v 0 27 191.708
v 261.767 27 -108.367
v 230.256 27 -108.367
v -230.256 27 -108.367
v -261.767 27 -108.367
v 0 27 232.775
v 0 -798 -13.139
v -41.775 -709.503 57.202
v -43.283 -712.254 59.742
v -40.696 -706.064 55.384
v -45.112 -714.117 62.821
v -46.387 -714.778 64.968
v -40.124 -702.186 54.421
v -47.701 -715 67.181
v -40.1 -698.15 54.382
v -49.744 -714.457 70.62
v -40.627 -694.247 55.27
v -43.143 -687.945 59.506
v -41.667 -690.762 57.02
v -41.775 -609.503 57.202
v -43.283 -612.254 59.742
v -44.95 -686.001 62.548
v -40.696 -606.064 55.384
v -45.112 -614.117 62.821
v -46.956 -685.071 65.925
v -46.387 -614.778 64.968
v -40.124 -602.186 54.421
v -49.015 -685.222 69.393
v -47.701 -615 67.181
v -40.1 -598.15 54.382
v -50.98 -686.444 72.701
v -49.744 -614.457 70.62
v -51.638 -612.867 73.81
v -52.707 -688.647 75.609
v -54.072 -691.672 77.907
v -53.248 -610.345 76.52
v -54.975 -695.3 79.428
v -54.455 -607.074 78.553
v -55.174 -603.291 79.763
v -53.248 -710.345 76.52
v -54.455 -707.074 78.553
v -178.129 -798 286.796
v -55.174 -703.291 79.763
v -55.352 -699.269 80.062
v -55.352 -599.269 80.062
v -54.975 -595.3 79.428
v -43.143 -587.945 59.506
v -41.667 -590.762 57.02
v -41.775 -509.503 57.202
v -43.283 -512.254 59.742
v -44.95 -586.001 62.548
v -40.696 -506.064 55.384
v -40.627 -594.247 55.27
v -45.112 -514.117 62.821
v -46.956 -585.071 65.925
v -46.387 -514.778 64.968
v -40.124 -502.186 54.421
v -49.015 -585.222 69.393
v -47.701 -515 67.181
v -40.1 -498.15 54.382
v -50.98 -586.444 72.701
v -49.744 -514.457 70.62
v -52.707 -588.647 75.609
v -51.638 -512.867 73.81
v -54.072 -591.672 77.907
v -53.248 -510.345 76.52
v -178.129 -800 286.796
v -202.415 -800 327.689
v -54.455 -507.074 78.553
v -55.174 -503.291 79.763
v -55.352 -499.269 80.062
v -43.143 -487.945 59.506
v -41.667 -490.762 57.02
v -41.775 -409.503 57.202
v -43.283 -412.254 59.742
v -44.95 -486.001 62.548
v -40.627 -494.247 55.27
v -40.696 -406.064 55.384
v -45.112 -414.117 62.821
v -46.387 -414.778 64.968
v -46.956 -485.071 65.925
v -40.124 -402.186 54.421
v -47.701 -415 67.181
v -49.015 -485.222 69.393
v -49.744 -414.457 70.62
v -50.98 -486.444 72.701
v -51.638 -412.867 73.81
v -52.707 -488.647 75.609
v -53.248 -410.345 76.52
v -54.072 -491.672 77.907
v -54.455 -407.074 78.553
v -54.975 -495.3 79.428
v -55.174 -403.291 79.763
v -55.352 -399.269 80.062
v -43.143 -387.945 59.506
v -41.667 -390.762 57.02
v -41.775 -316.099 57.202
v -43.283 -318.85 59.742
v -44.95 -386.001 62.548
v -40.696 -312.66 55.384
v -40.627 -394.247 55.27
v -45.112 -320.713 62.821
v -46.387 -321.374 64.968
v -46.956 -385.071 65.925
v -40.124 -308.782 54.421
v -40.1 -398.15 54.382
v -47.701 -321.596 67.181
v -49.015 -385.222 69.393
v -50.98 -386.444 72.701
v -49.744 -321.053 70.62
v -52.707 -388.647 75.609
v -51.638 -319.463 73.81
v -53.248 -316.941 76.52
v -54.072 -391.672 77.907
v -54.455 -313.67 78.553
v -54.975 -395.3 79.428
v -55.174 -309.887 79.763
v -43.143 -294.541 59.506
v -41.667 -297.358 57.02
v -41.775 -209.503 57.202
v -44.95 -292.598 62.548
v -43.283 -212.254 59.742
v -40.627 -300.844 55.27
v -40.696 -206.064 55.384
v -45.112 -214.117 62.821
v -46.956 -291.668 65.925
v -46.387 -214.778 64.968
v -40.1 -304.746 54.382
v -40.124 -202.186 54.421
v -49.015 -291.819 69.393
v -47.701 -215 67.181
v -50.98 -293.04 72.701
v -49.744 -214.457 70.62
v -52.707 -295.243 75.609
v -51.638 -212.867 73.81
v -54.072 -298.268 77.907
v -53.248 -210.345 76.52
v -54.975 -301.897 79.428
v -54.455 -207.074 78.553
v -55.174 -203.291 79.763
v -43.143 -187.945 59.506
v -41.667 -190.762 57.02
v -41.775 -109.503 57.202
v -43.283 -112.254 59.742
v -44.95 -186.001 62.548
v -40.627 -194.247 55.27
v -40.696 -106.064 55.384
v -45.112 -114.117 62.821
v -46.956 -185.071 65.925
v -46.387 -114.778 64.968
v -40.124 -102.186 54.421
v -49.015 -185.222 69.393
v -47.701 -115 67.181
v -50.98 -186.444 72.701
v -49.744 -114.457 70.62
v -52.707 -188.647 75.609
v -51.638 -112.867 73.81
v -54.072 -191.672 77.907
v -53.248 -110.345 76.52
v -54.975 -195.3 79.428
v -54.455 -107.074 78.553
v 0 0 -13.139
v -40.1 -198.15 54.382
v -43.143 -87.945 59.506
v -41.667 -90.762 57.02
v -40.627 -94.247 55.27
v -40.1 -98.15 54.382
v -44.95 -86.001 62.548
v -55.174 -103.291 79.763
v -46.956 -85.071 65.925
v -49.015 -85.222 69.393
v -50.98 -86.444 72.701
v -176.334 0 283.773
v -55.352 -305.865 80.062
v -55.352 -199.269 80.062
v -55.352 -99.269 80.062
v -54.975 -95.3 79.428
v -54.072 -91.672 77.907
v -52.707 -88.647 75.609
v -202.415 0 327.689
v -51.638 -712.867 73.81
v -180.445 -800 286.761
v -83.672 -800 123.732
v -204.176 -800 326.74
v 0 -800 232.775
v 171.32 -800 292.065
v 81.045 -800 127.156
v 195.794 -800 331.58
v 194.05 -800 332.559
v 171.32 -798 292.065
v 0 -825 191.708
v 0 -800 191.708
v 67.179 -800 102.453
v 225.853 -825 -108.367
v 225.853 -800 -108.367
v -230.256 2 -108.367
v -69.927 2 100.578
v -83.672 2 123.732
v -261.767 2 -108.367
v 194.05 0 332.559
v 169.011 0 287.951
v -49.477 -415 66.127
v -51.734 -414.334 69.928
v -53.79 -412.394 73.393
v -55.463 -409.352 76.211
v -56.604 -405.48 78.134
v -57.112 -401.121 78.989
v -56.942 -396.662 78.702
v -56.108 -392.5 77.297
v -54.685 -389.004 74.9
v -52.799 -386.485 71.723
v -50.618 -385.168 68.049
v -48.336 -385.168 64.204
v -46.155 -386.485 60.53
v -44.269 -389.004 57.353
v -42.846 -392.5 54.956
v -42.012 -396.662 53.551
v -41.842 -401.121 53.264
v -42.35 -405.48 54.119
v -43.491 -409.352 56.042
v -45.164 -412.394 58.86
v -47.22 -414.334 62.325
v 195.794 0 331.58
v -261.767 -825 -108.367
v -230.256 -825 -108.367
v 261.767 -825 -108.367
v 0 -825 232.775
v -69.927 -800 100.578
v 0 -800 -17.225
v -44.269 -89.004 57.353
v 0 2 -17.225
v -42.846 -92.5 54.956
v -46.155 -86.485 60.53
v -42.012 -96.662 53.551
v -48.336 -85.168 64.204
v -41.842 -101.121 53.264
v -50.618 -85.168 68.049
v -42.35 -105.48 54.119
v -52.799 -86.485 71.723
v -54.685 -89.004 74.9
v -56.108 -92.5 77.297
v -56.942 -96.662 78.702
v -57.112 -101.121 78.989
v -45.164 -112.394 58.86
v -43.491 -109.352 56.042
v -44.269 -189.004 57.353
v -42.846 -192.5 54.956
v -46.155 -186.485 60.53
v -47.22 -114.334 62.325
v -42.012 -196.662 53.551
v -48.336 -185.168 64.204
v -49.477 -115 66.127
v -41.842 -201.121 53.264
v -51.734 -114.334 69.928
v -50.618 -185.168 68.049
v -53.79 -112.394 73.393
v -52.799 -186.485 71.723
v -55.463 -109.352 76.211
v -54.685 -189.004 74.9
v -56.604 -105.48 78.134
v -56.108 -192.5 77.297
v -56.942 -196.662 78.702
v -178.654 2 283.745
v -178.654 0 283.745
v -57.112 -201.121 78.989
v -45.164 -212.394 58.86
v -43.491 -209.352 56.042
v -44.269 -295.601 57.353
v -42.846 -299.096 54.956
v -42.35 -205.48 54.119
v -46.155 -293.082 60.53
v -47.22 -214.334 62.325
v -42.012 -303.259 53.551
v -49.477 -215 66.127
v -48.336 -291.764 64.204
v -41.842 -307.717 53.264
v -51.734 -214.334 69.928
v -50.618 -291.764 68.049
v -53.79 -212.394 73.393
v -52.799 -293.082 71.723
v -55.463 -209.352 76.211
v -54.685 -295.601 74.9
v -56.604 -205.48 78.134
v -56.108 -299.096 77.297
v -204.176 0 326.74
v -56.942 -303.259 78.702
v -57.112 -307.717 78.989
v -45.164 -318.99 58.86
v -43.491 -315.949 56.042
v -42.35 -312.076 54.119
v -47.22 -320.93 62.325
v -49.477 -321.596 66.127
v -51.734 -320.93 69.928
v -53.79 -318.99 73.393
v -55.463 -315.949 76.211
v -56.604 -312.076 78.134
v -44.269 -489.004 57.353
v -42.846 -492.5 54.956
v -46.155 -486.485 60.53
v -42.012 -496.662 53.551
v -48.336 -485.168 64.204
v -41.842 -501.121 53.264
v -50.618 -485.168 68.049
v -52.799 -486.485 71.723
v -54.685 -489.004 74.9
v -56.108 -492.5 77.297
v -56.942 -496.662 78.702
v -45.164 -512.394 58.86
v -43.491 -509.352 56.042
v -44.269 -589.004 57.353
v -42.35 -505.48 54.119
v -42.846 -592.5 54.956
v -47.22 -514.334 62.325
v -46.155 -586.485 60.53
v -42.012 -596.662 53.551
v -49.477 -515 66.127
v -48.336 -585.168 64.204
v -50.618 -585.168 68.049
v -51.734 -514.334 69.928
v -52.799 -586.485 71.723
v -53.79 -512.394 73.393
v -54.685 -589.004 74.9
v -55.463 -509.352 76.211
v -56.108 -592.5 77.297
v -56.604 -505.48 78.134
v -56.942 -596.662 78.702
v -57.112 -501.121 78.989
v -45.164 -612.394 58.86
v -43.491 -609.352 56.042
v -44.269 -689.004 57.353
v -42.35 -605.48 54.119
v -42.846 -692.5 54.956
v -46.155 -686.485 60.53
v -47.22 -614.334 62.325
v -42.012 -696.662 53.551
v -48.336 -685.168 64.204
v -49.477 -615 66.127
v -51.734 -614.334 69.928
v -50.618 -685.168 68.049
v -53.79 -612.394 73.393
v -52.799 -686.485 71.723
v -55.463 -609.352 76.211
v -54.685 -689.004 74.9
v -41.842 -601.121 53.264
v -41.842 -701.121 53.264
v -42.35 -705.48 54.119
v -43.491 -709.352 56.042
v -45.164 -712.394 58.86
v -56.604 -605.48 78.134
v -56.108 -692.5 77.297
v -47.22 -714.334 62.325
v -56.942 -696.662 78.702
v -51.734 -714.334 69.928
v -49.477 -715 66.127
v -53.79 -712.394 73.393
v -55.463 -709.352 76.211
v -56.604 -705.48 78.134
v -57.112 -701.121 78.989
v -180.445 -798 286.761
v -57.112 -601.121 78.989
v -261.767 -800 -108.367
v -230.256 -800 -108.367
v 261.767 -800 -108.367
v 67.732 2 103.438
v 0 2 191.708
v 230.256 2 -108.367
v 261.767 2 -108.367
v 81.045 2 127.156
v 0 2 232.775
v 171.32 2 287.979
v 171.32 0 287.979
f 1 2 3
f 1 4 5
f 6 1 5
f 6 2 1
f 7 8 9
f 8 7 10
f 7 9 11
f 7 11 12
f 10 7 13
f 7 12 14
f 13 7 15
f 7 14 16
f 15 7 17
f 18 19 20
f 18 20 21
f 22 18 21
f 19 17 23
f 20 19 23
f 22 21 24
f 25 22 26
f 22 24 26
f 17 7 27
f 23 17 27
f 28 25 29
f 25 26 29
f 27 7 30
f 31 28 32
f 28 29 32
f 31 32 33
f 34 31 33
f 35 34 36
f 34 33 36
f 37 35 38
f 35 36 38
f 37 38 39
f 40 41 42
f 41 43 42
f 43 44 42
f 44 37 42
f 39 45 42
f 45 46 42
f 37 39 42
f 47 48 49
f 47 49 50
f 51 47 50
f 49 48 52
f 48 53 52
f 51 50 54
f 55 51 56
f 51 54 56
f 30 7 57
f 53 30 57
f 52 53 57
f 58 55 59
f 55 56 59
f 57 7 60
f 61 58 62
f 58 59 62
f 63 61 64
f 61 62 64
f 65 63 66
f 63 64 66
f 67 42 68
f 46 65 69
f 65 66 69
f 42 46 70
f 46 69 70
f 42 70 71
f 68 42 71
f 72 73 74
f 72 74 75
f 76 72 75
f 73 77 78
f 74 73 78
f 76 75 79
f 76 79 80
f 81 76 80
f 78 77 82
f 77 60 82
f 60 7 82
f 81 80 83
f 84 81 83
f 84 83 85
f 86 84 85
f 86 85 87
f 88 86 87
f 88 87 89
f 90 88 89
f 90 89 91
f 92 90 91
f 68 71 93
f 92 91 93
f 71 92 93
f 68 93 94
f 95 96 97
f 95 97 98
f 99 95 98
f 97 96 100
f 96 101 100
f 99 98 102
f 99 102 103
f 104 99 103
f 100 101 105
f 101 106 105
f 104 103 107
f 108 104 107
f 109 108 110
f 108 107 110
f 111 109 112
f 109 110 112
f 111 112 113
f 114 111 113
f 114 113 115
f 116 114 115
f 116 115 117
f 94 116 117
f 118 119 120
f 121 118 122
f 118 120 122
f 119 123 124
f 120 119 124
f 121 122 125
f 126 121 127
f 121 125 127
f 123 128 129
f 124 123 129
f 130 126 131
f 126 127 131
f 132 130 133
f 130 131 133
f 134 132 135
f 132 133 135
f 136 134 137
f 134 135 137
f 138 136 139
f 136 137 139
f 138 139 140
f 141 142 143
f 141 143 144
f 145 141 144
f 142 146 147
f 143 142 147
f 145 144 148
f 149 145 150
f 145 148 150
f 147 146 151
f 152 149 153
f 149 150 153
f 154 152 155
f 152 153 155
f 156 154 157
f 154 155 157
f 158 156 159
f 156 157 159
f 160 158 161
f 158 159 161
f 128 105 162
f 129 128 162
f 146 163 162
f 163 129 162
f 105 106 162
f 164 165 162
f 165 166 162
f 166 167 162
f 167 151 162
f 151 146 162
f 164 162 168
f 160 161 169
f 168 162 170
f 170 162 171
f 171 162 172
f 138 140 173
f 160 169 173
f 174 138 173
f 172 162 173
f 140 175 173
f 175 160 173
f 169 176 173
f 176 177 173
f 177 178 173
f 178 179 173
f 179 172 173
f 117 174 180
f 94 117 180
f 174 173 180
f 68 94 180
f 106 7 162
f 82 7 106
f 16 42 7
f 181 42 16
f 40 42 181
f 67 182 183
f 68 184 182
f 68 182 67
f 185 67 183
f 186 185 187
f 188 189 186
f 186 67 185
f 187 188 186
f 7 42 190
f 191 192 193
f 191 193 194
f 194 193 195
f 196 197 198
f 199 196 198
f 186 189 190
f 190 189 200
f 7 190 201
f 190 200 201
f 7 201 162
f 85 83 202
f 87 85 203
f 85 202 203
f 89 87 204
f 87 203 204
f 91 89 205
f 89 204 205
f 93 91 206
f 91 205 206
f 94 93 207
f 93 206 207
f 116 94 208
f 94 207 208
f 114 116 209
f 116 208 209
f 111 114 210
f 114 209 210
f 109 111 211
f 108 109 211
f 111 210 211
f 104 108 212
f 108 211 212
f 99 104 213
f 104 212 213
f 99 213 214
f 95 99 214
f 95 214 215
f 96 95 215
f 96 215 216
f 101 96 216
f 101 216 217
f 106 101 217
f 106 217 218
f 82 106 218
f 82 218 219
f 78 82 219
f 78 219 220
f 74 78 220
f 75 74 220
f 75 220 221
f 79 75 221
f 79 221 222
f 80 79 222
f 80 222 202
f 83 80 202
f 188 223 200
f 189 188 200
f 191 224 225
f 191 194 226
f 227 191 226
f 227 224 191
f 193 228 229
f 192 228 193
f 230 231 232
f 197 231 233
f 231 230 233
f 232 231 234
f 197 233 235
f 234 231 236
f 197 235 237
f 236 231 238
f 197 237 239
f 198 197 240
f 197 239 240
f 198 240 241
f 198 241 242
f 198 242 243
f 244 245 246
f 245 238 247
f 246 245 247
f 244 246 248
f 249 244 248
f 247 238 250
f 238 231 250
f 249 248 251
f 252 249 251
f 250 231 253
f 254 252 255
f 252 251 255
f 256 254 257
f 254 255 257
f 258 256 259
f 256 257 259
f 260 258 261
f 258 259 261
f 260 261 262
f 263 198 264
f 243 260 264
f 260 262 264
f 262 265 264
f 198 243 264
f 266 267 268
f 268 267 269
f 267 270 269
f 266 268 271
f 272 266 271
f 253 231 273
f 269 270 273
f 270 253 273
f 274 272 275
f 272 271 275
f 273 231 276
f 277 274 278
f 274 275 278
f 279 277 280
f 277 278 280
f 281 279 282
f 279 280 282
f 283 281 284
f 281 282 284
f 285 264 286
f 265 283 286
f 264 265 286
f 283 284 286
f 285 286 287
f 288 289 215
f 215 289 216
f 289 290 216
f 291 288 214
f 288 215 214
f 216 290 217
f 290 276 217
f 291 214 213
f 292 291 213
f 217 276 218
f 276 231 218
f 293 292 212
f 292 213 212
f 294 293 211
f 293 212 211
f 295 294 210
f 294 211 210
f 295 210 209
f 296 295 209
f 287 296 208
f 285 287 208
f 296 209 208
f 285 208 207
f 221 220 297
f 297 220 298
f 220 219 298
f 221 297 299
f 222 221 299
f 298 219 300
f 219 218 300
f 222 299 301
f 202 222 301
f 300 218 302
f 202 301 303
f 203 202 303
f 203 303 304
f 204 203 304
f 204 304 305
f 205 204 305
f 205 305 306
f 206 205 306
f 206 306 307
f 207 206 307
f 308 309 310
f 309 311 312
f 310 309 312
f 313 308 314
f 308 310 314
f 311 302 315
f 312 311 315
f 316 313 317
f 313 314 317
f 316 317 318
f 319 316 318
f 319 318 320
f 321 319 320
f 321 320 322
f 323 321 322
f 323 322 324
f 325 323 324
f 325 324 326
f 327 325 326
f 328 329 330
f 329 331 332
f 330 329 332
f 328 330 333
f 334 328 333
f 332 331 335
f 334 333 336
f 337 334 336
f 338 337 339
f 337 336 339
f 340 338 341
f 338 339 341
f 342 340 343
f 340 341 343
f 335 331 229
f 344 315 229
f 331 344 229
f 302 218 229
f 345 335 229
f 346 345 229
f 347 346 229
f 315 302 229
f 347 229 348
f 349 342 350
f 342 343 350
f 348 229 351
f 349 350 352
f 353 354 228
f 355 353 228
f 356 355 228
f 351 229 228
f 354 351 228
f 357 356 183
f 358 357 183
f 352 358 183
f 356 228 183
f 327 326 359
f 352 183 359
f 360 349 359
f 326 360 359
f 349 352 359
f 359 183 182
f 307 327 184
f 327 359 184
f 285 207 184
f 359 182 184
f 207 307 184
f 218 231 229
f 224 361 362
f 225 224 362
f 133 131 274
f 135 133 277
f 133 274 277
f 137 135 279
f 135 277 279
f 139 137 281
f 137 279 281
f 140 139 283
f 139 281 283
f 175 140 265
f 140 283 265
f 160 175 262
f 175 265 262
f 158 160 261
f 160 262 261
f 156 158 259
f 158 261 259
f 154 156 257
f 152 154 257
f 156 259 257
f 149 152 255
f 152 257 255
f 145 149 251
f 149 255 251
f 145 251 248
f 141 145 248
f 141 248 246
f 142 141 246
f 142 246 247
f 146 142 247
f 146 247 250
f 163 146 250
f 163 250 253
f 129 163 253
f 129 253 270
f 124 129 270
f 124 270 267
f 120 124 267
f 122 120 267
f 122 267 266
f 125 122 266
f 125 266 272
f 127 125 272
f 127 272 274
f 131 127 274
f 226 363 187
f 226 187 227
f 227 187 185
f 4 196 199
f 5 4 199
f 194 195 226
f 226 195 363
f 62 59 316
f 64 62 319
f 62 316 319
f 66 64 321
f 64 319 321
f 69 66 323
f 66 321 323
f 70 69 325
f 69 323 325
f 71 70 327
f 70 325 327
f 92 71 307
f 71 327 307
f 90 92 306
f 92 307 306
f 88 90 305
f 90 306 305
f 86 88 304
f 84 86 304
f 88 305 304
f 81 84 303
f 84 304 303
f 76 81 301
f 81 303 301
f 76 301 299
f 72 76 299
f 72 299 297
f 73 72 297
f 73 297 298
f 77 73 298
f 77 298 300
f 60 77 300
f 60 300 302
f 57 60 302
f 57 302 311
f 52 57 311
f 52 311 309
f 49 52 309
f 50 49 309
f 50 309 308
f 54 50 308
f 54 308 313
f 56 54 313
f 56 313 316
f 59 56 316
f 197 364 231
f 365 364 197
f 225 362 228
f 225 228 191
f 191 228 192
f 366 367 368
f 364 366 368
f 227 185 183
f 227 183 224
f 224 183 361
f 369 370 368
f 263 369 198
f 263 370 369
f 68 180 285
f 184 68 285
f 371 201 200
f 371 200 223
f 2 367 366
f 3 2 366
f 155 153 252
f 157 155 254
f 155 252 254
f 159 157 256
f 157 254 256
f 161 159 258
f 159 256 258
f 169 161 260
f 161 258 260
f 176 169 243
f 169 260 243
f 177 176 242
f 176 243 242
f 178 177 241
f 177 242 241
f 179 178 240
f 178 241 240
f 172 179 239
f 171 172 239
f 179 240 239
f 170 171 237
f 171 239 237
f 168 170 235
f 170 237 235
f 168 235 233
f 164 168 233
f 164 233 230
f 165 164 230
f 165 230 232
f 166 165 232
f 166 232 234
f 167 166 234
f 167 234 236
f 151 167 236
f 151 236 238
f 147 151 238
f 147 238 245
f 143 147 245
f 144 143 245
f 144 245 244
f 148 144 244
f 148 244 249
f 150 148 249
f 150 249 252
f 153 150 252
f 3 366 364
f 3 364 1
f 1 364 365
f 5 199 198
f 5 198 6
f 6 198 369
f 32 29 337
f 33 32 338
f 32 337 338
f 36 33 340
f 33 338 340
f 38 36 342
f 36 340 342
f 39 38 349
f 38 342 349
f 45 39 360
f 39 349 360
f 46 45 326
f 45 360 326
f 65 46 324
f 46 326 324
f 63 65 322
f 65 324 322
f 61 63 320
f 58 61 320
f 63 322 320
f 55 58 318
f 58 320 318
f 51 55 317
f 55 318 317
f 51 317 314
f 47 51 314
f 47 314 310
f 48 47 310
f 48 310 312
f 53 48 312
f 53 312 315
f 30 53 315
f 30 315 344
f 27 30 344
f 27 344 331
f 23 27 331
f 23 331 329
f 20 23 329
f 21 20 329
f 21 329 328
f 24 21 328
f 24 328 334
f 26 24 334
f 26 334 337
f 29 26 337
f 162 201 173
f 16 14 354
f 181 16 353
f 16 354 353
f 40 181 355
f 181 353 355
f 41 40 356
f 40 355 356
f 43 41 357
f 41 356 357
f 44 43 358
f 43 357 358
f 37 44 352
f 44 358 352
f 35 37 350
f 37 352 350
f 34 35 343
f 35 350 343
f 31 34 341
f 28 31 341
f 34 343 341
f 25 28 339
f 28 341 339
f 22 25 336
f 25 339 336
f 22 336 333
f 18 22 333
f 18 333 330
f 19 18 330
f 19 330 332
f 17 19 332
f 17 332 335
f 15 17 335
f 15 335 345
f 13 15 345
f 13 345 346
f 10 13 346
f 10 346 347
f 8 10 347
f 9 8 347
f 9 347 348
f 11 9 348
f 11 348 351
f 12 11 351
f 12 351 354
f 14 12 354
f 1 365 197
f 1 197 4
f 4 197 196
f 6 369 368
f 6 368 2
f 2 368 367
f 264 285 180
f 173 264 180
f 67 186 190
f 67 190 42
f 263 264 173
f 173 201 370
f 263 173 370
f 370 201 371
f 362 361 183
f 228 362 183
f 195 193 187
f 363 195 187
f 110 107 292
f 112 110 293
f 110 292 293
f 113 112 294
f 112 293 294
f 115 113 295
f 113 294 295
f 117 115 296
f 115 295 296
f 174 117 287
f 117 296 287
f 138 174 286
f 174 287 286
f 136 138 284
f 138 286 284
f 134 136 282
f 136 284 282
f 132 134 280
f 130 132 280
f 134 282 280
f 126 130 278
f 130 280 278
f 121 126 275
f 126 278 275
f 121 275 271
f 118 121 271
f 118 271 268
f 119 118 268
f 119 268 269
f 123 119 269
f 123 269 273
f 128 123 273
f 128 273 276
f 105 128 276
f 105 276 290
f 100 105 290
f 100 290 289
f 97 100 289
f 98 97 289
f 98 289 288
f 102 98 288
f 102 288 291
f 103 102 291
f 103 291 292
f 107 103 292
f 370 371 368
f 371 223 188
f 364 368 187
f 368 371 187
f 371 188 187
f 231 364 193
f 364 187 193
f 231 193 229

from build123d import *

# Parameters (mm, degrees)
F1_DEPTH  = 800
F3_DEPTH  = 2
F5_DEPTH  = 2
F7_DEPTH  = 25
F9_DEPTH  = 25
F11_R     = 15
F12_DEPTH = 10


with BuildPart() as f1:
    # F0 (on Front) → F1 (new body)
    with BuildSketch(Plane.XZ):
        Polygon((-202.4154143159, 327.6886455222), (-204.1763566452, 326.7404461164), (0, -17.224690761), (195.7943682295, 331.5797893846), (194.0503458287, 332.5587612257), (0, -13.1387713996), align=None)
    extrude(amount=F1_DEPTH)

    # F2 (on face) → F3 (join)
    with BuildSketch(Plane.XZ.offset(800)):
        Polygon((0, -13.1387713996), (171.3200722008, 292.0651487278), (-180.4445918465, 286.7607939107), align=None)
    extrude(amount=-F3_DEPTH)

    # F4 (on face) → F5 (join)
    with BuildSketch(Plane(origin=(0, 0, 0), x_dir=(-1, 0, 0), z_dir=(0, 1, 0))):
        Polygon((-171.3200722008, 287.9792293664), (0, -17.224690761), (178.6543120645, 283.7448040067), align=None)
    extrude(amount=F5_DEPTH)

    # F6 (on face) → F7 (join)
    with BuildSketch(Plane(origin=(0, 2, 0), x_dir=(-1, 0, 0), z_dir=(0, 1, 0))):
        Polygon((-67.7318355426, 103.4384718181), (-81.0449193734, 127.1555139717), (-261.7674144737, -108.3666270862), (-230.2556041235, -108.3666270862), align=None)
        Polygon((261.7674144737, -108.3666270862), (83.6715723559, 123.7323931592), (69.9270135898, 100.5776600892), (230.2556041235, -108.3666270862), align=None)
        Polygon((83.6715723559, 123.7323931592), (0, 232.775309239), (-81.0449193734, 127.1555139717), (-67.7318355426, 103.4384718181), (0, 191.7083184464), (69.9270135898, 100.5776600892), align=None)
    extrude(amount=F7_DEPTH)

    # F8 (on face) → F9 (join)
    with BuildSketch(Plane.XZ.offset(800)):
        Polygon((81.0449193734, 127.1555139717), (0, 232.775309239), (-83.6715723559, 123.7323931592), (-69.9270135898, 100.5776600892), (0, 191.7083184464), (67.1786031406, 102.4528972986), align=None)
        Polygon((261.7674144737, -108.3666270862), (81.0449193734, 127.1555139717), (67.1786031406, 102.4528972986), (225.8531237559, -108.3666270862), align=None)
        Polygon((-69.9270135898, 100.5776600892), (-83.6715723559, 123.7323931592), (-261.7674144737, -108.3666270862), (-230.2556041235, -108.3666270862), align=None)
    extrude(amount=F9_DEPTH)

    # F11 (on face) → F12 (cut)
    with BuildSketch(Plane(origin=(-7.5605140907, 0, -4.4878915213), x_dir=(0, -1, 0), z_dir=(-0.8599128422, 0, -0.5104408916))):
        with Locations((400, 82.1180880011)):
            Circle(F11_R)
        with Locations((306.596378018, 82.1180880011)):
            Circle(F11_R)
        with Locations((200, 82.1180880011)):
            Circle(F11_R)
        with Locations((100, 82.1180880011)):
            Circle(F11_R)
        with Locations((500, 82.1180880011)):
            Circle(F11_R)
        with Locations((600, 82.1180880011)):
            Circle(F11_R)
        with Locations((700, 82.1180880011)):
            Circle(F11_R)
    extrude(amount=-F12_DEPTH, mode=Mode.SUBTRACT)


solid = f1.part
